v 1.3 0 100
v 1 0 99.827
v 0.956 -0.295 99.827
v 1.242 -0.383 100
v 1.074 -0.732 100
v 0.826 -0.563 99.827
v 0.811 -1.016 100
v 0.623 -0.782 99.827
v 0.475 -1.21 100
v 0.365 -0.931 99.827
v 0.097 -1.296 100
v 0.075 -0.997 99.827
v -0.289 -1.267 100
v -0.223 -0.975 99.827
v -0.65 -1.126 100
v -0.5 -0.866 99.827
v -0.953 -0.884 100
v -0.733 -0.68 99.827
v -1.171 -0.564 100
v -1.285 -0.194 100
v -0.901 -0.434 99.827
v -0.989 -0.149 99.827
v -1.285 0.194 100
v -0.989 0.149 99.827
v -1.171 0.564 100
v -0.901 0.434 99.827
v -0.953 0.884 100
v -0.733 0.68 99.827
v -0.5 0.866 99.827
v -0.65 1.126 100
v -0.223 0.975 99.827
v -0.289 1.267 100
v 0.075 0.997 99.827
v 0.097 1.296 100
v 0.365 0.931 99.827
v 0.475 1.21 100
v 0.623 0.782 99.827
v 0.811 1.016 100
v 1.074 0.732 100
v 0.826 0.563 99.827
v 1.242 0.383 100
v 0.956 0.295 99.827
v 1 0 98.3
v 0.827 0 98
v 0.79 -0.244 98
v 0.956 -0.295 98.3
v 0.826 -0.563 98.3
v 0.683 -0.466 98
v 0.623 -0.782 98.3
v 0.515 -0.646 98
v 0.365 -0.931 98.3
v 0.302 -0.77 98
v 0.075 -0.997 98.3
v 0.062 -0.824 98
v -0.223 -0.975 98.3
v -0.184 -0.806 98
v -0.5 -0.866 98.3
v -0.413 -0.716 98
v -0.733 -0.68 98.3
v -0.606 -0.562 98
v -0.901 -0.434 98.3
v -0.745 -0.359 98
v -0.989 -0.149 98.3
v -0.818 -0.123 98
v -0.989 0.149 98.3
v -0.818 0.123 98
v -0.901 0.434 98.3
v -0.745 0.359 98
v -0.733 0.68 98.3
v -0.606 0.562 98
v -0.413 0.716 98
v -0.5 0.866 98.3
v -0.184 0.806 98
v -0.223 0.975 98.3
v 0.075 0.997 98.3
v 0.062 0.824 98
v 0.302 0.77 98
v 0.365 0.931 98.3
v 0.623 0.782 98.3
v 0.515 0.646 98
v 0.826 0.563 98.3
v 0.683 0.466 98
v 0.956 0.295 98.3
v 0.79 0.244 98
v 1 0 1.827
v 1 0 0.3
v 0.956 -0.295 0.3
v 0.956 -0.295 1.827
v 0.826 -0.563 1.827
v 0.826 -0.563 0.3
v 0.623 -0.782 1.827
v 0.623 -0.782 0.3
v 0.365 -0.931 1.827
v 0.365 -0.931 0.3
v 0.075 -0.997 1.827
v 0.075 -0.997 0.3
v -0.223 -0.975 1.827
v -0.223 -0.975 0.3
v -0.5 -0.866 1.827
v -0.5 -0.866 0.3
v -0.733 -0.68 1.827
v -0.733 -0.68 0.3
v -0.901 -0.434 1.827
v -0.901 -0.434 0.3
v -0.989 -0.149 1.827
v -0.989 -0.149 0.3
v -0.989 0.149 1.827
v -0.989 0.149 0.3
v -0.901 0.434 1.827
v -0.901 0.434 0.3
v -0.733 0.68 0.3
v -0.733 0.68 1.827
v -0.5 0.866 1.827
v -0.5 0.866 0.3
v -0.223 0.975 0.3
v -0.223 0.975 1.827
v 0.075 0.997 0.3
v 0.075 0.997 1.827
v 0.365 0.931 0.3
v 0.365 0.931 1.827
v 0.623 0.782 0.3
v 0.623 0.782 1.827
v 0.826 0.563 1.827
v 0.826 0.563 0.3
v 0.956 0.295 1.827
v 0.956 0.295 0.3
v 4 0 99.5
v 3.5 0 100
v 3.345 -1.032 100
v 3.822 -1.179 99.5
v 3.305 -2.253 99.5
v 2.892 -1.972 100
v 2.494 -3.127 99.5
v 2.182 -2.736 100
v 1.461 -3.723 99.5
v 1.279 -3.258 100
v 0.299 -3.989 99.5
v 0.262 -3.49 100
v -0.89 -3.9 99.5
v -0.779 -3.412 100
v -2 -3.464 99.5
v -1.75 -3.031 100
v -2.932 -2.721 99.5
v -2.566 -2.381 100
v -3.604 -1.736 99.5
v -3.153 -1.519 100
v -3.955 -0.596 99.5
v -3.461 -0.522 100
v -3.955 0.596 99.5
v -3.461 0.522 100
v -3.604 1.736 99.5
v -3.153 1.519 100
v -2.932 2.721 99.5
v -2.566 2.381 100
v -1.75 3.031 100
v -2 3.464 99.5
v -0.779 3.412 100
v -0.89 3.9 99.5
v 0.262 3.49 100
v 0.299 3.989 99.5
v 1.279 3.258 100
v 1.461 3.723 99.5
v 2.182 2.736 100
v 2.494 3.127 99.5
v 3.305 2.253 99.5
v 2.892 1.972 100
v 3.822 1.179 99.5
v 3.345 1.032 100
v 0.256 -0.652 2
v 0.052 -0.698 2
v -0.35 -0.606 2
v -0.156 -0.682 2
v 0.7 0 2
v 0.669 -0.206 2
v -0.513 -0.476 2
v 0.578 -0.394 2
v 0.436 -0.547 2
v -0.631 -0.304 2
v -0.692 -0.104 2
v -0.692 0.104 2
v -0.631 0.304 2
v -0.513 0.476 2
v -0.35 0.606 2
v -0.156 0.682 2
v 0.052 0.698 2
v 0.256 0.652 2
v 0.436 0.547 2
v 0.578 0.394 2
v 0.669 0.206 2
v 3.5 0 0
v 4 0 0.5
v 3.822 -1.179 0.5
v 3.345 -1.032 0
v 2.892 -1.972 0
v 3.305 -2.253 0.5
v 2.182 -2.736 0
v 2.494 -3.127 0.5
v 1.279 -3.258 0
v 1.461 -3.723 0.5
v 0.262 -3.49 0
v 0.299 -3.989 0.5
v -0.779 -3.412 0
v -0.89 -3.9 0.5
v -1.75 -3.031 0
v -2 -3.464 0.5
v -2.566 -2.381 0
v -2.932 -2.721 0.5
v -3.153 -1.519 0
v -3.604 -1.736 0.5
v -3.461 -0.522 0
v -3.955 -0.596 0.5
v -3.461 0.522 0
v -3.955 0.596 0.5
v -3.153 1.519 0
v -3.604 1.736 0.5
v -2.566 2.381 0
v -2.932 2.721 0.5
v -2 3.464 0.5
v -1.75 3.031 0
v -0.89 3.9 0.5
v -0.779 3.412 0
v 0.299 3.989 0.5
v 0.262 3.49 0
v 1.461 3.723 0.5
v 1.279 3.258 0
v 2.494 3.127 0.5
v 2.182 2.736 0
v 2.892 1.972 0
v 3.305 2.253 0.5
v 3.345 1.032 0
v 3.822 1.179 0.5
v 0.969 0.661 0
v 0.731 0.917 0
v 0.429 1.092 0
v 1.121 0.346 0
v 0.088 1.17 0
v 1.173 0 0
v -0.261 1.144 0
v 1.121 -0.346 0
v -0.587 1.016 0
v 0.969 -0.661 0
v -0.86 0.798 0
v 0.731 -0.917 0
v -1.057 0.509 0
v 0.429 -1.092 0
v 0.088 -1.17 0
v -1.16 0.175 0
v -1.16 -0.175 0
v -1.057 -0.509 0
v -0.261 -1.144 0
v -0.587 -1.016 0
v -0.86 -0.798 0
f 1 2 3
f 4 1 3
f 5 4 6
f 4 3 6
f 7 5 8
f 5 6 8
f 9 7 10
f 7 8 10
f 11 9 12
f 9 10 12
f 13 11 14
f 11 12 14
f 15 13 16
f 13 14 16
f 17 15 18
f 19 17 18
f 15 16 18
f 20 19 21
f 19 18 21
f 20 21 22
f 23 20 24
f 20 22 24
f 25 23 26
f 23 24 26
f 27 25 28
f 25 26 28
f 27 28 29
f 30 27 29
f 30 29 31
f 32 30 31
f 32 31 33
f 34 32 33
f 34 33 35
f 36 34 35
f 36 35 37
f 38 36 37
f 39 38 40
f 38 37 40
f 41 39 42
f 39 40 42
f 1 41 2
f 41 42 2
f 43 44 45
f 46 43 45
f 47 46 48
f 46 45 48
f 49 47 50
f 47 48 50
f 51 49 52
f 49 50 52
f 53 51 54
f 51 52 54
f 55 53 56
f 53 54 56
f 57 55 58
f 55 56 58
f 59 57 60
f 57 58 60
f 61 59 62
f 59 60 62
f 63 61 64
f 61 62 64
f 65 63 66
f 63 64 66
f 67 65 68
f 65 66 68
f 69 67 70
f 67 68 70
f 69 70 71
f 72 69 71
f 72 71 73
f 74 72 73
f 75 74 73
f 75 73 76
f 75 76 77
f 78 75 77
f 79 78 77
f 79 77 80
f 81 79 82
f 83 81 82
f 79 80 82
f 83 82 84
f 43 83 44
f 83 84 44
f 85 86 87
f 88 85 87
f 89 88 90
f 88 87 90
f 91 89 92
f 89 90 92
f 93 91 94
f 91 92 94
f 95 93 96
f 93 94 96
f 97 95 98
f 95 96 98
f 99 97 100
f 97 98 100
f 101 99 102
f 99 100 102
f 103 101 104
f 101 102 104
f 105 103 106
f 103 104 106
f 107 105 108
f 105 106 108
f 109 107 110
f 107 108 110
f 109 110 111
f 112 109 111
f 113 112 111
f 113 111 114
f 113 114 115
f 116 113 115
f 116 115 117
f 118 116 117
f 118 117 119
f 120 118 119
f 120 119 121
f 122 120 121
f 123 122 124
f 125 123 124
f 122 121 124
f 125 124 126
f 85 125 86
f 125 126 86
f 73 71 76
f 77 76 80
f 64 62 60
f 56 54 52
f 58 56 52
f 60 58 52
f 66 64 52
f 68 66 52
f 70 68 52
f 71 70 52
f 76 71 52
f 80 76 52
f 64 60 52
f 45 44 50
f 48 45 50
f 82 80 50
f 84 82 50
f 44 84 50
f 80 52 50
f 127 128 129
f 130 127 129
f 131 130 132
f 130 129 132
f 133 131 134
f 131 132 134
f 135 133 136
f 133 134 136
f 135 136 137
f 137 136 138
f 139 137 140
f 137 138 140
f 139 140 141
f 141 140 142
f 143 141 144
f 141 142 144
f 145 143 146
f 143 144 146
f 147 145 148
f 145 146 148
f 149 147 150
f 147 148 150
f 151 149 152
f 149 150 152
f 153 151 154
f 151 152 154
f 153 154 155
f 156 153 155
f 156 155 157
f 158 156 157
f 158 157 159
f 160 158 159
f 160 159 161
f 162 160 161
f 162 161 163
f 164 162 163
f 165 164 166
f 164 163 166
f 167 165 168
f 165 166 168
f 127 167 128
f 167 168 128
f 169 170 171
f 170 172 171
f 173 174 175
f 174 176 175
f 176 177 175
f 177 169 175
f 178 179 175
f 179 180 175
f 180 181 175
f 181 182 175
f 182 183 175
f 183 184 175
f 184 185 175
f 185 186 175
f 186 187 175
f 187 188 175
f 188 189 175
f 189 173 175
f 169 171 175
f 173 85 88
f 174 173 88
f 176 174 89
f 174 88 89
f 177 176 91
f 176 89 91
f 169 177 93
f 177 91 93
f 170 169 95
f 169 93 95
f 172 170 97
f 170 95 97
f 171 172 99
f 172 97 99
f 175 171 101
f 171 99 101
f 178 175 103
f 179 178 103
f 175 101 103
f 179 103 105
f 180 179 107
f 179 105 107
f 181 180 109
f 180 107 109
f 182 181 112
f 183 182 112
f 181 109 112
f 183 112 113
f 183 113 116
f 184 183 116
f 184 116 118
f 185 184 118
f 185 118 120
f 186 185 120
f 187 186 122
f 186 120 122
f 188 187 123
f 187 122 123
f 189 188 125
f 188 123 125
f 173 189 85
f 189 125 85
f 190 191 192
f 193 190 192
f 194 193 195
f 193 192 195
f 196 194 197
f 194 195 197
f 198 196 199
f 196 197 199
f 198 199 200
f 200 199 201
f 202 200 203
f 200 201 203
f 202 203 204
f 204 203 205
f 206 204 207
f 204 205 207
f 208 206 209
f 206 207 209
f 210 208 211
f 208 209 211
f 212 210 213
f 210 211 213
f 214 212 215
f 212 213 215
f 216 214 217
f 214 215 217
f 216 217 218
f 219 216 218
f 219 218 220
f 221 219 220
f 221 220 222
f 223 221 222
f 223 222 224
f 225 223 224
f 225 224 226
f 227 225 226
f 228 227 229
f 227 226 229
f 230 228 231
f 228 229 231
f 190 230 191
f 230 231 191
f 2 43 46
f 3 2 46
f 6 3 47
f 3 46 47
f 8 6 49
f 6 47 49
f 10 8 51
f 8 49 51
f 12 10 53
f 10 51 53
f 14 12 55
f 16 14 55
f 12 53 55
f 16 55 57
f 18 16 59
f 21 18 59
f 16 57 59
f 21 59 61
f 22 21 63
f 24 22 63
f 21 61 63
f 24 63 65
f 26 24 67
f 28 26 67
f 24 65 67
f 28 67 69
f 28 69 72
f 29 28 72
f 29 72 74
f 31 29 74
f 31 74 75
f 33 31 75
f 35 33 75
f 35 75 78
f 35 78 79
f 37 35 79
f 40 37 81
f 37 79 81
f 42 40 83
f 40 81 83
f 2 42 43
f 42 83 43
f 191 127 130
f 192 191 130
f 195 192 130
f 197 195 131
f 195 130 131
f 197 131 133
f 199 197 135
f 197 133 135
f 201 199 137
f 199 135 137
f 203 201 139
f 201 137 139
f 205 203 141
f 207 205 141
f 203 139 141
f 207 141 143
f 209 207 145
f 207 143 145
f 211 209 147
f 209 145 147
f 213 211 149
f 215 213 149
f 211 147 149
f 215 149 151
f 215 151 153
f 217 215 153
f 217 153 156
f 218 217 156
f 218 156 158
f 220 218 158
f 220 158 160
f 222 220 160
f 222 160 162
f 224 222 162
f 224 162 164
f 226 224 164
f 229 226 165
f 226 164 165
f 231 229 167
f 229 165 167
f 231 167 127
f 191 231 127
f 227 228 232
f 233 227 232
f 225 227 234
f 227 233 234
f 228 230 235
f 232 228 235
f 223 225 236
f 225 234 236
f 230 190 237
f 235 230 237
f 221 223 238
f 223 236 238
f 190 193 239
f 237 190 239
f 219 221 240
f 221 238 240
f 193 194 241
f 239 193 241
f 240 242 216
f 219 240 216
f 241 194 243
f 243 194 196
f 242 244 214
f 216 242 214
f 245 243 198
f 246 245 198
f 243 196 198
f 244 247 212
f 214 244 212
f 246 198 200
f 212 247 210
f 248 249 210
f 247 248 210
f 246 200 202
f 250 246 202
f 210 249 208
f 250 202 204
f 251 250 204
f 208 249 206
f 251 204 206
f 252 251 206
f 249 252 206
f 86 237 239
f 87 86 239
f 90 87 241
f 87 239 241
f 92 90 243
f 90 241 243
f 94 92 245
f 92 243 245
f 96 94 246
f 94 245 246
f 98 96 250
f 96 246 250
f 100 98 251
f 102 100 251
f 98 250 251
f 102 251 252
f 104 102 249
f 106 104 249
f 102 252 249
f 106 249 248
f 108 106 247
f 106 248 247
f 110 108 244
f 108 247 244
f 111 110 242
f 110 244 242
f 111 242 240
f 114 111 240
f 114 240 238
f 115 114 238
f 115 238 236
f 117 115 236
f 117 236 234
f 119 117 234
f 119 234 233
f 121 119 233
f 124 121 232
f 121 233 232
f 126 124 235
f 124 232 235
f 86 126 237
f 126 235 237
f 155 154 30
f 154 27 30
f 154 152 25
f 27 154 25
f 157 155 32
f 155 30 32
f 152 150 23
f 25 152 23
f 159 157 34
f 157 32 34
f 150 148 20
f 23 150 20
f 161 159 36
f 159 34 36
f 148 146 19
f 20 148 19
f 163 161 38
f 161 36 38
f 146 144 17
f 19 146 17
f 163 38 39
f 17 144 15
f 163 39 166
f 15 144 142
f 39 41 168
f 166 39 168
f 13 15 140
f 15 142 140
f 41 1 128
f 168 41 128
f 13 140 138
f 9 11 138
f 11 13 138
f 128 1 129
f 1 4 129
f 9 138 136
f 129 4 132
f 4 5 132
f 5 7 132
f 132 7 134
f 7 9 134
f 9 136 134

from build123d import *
from OCP.BRepFilletAPI import BRepFilletAPI_MakeChamfer

# Parameters (mm, degrees)
CHAMFER1_SIZE  = 0.5
CHAMFER2_SIZE  = 0.3
CHAMFER2_SIZE2 = 0.173205081


with BuildPart() as part:
    # Sketch1 → Revolve1 (revolve)
    with BuildSketch(Plane(origin=(0, 0, 0), x_dir=(1, 0, 0), z_dir=(0, 1, 0)), mode=Mode.PRIVATE) as revolve1_sk:
        Polygon((-1, 0), (-4, 0), (-4, -100), (-1, -100), (-1, -98), (0, -98), (0, -2), (-1, -2), align=None)
    revolve(revolve1_sk.sketch.rotate(Axis((0, 0, 98), (0, 0, -1)), 180), axis=Axis((0, 0, 98), (0, 0, -1)))

    # Chamfer1
    chamfer1_edges = [part.edges().sort_by_distance(p)[0] for p in [
        (-4, 0, 100),
        (-4, 0, 0),
    ]]
    chamfer(chamfer1_edges, length=CHAMFER1_SIZE)

    # Chamfer2: one chamfer whose edges measure the first distance from different faces: ONE call of the kernel's chamfer builder (chamfer() names one face for all edges)
    chamfer2_edges_1 = [part.edges().sort_by_distance(p)[0] for p in [
        (-1, 0, 2),
    ]]
    chamfer2_side_1 = [part.faces().sort_by_distance(p)[0] for p in [
        (0, 0, 2),
    ]]
    chamfer2_edges_2 = [part.edges().sort_by_distance(p)[0] for p in [
        (-1, 0, 98),
    ]]
    chamfer2_side_2 = [part.faces().sort_by_distance(p)[0] for p in [
        (-1, 0, 99),
    ]]
    chamfer2_edges_3 = [part.edges().sort_by_distance(p)[0] for p in [
        (-1, 0, 100),
    ]]
    chamfer2_side_3 = [part.faces().sort_by_distance(p)[0] for p in [
        (-3.401005051, 0, 100),
    ]]
    chamfer2_edges_4 = [part.edges().sort_by_distance(p)[0] for p in [
        (-1, 0, 0),
    ]]
    chamfer2_side_4 = [part.faces().sort_by_distance(p)[0] for p in [
        (-1, 0, 1),
    ]]
    chamfer2 = BRepFilletAPI_MakeChamfer(part.part.solid().wrapped)
    for e in chamfer2_edges_1:
        chamfer2.Add(CHAMFER2_SIZE, CHAMFER2_SIZE2, e.wrapped, chamfer2_side_1[0].wrapped)  # the first distance lies on this face
    for e in chamfer2_edges_2:
        chamfer2.Add(CHAMFER2_SIZE, CHAMFER2_SIZE2, e.wrapped, chamfer2_side_2[0].wrapped)  # the first distance lies on this face
    for e in chamfer2_edges_3:
        chamfer2.Add(CHAMFER2_SIZE, CHAMFER2_SIZE2, e.wrapped, chamfer2_side_3[0].wrapped)  # the first distance lies on this face
    for e in chamfer2_edges_4:
        chamfer2.Add(CHAMFER2_SIZE, CHAMFER2_SIZE2, e.wrapped, chamfer2_side_4[0].wrapped)  # the first distance lies on this face
    add(Compound.cast(chamfer2.Shape()), mode=Mode.REPLACE)


solid = part.part
